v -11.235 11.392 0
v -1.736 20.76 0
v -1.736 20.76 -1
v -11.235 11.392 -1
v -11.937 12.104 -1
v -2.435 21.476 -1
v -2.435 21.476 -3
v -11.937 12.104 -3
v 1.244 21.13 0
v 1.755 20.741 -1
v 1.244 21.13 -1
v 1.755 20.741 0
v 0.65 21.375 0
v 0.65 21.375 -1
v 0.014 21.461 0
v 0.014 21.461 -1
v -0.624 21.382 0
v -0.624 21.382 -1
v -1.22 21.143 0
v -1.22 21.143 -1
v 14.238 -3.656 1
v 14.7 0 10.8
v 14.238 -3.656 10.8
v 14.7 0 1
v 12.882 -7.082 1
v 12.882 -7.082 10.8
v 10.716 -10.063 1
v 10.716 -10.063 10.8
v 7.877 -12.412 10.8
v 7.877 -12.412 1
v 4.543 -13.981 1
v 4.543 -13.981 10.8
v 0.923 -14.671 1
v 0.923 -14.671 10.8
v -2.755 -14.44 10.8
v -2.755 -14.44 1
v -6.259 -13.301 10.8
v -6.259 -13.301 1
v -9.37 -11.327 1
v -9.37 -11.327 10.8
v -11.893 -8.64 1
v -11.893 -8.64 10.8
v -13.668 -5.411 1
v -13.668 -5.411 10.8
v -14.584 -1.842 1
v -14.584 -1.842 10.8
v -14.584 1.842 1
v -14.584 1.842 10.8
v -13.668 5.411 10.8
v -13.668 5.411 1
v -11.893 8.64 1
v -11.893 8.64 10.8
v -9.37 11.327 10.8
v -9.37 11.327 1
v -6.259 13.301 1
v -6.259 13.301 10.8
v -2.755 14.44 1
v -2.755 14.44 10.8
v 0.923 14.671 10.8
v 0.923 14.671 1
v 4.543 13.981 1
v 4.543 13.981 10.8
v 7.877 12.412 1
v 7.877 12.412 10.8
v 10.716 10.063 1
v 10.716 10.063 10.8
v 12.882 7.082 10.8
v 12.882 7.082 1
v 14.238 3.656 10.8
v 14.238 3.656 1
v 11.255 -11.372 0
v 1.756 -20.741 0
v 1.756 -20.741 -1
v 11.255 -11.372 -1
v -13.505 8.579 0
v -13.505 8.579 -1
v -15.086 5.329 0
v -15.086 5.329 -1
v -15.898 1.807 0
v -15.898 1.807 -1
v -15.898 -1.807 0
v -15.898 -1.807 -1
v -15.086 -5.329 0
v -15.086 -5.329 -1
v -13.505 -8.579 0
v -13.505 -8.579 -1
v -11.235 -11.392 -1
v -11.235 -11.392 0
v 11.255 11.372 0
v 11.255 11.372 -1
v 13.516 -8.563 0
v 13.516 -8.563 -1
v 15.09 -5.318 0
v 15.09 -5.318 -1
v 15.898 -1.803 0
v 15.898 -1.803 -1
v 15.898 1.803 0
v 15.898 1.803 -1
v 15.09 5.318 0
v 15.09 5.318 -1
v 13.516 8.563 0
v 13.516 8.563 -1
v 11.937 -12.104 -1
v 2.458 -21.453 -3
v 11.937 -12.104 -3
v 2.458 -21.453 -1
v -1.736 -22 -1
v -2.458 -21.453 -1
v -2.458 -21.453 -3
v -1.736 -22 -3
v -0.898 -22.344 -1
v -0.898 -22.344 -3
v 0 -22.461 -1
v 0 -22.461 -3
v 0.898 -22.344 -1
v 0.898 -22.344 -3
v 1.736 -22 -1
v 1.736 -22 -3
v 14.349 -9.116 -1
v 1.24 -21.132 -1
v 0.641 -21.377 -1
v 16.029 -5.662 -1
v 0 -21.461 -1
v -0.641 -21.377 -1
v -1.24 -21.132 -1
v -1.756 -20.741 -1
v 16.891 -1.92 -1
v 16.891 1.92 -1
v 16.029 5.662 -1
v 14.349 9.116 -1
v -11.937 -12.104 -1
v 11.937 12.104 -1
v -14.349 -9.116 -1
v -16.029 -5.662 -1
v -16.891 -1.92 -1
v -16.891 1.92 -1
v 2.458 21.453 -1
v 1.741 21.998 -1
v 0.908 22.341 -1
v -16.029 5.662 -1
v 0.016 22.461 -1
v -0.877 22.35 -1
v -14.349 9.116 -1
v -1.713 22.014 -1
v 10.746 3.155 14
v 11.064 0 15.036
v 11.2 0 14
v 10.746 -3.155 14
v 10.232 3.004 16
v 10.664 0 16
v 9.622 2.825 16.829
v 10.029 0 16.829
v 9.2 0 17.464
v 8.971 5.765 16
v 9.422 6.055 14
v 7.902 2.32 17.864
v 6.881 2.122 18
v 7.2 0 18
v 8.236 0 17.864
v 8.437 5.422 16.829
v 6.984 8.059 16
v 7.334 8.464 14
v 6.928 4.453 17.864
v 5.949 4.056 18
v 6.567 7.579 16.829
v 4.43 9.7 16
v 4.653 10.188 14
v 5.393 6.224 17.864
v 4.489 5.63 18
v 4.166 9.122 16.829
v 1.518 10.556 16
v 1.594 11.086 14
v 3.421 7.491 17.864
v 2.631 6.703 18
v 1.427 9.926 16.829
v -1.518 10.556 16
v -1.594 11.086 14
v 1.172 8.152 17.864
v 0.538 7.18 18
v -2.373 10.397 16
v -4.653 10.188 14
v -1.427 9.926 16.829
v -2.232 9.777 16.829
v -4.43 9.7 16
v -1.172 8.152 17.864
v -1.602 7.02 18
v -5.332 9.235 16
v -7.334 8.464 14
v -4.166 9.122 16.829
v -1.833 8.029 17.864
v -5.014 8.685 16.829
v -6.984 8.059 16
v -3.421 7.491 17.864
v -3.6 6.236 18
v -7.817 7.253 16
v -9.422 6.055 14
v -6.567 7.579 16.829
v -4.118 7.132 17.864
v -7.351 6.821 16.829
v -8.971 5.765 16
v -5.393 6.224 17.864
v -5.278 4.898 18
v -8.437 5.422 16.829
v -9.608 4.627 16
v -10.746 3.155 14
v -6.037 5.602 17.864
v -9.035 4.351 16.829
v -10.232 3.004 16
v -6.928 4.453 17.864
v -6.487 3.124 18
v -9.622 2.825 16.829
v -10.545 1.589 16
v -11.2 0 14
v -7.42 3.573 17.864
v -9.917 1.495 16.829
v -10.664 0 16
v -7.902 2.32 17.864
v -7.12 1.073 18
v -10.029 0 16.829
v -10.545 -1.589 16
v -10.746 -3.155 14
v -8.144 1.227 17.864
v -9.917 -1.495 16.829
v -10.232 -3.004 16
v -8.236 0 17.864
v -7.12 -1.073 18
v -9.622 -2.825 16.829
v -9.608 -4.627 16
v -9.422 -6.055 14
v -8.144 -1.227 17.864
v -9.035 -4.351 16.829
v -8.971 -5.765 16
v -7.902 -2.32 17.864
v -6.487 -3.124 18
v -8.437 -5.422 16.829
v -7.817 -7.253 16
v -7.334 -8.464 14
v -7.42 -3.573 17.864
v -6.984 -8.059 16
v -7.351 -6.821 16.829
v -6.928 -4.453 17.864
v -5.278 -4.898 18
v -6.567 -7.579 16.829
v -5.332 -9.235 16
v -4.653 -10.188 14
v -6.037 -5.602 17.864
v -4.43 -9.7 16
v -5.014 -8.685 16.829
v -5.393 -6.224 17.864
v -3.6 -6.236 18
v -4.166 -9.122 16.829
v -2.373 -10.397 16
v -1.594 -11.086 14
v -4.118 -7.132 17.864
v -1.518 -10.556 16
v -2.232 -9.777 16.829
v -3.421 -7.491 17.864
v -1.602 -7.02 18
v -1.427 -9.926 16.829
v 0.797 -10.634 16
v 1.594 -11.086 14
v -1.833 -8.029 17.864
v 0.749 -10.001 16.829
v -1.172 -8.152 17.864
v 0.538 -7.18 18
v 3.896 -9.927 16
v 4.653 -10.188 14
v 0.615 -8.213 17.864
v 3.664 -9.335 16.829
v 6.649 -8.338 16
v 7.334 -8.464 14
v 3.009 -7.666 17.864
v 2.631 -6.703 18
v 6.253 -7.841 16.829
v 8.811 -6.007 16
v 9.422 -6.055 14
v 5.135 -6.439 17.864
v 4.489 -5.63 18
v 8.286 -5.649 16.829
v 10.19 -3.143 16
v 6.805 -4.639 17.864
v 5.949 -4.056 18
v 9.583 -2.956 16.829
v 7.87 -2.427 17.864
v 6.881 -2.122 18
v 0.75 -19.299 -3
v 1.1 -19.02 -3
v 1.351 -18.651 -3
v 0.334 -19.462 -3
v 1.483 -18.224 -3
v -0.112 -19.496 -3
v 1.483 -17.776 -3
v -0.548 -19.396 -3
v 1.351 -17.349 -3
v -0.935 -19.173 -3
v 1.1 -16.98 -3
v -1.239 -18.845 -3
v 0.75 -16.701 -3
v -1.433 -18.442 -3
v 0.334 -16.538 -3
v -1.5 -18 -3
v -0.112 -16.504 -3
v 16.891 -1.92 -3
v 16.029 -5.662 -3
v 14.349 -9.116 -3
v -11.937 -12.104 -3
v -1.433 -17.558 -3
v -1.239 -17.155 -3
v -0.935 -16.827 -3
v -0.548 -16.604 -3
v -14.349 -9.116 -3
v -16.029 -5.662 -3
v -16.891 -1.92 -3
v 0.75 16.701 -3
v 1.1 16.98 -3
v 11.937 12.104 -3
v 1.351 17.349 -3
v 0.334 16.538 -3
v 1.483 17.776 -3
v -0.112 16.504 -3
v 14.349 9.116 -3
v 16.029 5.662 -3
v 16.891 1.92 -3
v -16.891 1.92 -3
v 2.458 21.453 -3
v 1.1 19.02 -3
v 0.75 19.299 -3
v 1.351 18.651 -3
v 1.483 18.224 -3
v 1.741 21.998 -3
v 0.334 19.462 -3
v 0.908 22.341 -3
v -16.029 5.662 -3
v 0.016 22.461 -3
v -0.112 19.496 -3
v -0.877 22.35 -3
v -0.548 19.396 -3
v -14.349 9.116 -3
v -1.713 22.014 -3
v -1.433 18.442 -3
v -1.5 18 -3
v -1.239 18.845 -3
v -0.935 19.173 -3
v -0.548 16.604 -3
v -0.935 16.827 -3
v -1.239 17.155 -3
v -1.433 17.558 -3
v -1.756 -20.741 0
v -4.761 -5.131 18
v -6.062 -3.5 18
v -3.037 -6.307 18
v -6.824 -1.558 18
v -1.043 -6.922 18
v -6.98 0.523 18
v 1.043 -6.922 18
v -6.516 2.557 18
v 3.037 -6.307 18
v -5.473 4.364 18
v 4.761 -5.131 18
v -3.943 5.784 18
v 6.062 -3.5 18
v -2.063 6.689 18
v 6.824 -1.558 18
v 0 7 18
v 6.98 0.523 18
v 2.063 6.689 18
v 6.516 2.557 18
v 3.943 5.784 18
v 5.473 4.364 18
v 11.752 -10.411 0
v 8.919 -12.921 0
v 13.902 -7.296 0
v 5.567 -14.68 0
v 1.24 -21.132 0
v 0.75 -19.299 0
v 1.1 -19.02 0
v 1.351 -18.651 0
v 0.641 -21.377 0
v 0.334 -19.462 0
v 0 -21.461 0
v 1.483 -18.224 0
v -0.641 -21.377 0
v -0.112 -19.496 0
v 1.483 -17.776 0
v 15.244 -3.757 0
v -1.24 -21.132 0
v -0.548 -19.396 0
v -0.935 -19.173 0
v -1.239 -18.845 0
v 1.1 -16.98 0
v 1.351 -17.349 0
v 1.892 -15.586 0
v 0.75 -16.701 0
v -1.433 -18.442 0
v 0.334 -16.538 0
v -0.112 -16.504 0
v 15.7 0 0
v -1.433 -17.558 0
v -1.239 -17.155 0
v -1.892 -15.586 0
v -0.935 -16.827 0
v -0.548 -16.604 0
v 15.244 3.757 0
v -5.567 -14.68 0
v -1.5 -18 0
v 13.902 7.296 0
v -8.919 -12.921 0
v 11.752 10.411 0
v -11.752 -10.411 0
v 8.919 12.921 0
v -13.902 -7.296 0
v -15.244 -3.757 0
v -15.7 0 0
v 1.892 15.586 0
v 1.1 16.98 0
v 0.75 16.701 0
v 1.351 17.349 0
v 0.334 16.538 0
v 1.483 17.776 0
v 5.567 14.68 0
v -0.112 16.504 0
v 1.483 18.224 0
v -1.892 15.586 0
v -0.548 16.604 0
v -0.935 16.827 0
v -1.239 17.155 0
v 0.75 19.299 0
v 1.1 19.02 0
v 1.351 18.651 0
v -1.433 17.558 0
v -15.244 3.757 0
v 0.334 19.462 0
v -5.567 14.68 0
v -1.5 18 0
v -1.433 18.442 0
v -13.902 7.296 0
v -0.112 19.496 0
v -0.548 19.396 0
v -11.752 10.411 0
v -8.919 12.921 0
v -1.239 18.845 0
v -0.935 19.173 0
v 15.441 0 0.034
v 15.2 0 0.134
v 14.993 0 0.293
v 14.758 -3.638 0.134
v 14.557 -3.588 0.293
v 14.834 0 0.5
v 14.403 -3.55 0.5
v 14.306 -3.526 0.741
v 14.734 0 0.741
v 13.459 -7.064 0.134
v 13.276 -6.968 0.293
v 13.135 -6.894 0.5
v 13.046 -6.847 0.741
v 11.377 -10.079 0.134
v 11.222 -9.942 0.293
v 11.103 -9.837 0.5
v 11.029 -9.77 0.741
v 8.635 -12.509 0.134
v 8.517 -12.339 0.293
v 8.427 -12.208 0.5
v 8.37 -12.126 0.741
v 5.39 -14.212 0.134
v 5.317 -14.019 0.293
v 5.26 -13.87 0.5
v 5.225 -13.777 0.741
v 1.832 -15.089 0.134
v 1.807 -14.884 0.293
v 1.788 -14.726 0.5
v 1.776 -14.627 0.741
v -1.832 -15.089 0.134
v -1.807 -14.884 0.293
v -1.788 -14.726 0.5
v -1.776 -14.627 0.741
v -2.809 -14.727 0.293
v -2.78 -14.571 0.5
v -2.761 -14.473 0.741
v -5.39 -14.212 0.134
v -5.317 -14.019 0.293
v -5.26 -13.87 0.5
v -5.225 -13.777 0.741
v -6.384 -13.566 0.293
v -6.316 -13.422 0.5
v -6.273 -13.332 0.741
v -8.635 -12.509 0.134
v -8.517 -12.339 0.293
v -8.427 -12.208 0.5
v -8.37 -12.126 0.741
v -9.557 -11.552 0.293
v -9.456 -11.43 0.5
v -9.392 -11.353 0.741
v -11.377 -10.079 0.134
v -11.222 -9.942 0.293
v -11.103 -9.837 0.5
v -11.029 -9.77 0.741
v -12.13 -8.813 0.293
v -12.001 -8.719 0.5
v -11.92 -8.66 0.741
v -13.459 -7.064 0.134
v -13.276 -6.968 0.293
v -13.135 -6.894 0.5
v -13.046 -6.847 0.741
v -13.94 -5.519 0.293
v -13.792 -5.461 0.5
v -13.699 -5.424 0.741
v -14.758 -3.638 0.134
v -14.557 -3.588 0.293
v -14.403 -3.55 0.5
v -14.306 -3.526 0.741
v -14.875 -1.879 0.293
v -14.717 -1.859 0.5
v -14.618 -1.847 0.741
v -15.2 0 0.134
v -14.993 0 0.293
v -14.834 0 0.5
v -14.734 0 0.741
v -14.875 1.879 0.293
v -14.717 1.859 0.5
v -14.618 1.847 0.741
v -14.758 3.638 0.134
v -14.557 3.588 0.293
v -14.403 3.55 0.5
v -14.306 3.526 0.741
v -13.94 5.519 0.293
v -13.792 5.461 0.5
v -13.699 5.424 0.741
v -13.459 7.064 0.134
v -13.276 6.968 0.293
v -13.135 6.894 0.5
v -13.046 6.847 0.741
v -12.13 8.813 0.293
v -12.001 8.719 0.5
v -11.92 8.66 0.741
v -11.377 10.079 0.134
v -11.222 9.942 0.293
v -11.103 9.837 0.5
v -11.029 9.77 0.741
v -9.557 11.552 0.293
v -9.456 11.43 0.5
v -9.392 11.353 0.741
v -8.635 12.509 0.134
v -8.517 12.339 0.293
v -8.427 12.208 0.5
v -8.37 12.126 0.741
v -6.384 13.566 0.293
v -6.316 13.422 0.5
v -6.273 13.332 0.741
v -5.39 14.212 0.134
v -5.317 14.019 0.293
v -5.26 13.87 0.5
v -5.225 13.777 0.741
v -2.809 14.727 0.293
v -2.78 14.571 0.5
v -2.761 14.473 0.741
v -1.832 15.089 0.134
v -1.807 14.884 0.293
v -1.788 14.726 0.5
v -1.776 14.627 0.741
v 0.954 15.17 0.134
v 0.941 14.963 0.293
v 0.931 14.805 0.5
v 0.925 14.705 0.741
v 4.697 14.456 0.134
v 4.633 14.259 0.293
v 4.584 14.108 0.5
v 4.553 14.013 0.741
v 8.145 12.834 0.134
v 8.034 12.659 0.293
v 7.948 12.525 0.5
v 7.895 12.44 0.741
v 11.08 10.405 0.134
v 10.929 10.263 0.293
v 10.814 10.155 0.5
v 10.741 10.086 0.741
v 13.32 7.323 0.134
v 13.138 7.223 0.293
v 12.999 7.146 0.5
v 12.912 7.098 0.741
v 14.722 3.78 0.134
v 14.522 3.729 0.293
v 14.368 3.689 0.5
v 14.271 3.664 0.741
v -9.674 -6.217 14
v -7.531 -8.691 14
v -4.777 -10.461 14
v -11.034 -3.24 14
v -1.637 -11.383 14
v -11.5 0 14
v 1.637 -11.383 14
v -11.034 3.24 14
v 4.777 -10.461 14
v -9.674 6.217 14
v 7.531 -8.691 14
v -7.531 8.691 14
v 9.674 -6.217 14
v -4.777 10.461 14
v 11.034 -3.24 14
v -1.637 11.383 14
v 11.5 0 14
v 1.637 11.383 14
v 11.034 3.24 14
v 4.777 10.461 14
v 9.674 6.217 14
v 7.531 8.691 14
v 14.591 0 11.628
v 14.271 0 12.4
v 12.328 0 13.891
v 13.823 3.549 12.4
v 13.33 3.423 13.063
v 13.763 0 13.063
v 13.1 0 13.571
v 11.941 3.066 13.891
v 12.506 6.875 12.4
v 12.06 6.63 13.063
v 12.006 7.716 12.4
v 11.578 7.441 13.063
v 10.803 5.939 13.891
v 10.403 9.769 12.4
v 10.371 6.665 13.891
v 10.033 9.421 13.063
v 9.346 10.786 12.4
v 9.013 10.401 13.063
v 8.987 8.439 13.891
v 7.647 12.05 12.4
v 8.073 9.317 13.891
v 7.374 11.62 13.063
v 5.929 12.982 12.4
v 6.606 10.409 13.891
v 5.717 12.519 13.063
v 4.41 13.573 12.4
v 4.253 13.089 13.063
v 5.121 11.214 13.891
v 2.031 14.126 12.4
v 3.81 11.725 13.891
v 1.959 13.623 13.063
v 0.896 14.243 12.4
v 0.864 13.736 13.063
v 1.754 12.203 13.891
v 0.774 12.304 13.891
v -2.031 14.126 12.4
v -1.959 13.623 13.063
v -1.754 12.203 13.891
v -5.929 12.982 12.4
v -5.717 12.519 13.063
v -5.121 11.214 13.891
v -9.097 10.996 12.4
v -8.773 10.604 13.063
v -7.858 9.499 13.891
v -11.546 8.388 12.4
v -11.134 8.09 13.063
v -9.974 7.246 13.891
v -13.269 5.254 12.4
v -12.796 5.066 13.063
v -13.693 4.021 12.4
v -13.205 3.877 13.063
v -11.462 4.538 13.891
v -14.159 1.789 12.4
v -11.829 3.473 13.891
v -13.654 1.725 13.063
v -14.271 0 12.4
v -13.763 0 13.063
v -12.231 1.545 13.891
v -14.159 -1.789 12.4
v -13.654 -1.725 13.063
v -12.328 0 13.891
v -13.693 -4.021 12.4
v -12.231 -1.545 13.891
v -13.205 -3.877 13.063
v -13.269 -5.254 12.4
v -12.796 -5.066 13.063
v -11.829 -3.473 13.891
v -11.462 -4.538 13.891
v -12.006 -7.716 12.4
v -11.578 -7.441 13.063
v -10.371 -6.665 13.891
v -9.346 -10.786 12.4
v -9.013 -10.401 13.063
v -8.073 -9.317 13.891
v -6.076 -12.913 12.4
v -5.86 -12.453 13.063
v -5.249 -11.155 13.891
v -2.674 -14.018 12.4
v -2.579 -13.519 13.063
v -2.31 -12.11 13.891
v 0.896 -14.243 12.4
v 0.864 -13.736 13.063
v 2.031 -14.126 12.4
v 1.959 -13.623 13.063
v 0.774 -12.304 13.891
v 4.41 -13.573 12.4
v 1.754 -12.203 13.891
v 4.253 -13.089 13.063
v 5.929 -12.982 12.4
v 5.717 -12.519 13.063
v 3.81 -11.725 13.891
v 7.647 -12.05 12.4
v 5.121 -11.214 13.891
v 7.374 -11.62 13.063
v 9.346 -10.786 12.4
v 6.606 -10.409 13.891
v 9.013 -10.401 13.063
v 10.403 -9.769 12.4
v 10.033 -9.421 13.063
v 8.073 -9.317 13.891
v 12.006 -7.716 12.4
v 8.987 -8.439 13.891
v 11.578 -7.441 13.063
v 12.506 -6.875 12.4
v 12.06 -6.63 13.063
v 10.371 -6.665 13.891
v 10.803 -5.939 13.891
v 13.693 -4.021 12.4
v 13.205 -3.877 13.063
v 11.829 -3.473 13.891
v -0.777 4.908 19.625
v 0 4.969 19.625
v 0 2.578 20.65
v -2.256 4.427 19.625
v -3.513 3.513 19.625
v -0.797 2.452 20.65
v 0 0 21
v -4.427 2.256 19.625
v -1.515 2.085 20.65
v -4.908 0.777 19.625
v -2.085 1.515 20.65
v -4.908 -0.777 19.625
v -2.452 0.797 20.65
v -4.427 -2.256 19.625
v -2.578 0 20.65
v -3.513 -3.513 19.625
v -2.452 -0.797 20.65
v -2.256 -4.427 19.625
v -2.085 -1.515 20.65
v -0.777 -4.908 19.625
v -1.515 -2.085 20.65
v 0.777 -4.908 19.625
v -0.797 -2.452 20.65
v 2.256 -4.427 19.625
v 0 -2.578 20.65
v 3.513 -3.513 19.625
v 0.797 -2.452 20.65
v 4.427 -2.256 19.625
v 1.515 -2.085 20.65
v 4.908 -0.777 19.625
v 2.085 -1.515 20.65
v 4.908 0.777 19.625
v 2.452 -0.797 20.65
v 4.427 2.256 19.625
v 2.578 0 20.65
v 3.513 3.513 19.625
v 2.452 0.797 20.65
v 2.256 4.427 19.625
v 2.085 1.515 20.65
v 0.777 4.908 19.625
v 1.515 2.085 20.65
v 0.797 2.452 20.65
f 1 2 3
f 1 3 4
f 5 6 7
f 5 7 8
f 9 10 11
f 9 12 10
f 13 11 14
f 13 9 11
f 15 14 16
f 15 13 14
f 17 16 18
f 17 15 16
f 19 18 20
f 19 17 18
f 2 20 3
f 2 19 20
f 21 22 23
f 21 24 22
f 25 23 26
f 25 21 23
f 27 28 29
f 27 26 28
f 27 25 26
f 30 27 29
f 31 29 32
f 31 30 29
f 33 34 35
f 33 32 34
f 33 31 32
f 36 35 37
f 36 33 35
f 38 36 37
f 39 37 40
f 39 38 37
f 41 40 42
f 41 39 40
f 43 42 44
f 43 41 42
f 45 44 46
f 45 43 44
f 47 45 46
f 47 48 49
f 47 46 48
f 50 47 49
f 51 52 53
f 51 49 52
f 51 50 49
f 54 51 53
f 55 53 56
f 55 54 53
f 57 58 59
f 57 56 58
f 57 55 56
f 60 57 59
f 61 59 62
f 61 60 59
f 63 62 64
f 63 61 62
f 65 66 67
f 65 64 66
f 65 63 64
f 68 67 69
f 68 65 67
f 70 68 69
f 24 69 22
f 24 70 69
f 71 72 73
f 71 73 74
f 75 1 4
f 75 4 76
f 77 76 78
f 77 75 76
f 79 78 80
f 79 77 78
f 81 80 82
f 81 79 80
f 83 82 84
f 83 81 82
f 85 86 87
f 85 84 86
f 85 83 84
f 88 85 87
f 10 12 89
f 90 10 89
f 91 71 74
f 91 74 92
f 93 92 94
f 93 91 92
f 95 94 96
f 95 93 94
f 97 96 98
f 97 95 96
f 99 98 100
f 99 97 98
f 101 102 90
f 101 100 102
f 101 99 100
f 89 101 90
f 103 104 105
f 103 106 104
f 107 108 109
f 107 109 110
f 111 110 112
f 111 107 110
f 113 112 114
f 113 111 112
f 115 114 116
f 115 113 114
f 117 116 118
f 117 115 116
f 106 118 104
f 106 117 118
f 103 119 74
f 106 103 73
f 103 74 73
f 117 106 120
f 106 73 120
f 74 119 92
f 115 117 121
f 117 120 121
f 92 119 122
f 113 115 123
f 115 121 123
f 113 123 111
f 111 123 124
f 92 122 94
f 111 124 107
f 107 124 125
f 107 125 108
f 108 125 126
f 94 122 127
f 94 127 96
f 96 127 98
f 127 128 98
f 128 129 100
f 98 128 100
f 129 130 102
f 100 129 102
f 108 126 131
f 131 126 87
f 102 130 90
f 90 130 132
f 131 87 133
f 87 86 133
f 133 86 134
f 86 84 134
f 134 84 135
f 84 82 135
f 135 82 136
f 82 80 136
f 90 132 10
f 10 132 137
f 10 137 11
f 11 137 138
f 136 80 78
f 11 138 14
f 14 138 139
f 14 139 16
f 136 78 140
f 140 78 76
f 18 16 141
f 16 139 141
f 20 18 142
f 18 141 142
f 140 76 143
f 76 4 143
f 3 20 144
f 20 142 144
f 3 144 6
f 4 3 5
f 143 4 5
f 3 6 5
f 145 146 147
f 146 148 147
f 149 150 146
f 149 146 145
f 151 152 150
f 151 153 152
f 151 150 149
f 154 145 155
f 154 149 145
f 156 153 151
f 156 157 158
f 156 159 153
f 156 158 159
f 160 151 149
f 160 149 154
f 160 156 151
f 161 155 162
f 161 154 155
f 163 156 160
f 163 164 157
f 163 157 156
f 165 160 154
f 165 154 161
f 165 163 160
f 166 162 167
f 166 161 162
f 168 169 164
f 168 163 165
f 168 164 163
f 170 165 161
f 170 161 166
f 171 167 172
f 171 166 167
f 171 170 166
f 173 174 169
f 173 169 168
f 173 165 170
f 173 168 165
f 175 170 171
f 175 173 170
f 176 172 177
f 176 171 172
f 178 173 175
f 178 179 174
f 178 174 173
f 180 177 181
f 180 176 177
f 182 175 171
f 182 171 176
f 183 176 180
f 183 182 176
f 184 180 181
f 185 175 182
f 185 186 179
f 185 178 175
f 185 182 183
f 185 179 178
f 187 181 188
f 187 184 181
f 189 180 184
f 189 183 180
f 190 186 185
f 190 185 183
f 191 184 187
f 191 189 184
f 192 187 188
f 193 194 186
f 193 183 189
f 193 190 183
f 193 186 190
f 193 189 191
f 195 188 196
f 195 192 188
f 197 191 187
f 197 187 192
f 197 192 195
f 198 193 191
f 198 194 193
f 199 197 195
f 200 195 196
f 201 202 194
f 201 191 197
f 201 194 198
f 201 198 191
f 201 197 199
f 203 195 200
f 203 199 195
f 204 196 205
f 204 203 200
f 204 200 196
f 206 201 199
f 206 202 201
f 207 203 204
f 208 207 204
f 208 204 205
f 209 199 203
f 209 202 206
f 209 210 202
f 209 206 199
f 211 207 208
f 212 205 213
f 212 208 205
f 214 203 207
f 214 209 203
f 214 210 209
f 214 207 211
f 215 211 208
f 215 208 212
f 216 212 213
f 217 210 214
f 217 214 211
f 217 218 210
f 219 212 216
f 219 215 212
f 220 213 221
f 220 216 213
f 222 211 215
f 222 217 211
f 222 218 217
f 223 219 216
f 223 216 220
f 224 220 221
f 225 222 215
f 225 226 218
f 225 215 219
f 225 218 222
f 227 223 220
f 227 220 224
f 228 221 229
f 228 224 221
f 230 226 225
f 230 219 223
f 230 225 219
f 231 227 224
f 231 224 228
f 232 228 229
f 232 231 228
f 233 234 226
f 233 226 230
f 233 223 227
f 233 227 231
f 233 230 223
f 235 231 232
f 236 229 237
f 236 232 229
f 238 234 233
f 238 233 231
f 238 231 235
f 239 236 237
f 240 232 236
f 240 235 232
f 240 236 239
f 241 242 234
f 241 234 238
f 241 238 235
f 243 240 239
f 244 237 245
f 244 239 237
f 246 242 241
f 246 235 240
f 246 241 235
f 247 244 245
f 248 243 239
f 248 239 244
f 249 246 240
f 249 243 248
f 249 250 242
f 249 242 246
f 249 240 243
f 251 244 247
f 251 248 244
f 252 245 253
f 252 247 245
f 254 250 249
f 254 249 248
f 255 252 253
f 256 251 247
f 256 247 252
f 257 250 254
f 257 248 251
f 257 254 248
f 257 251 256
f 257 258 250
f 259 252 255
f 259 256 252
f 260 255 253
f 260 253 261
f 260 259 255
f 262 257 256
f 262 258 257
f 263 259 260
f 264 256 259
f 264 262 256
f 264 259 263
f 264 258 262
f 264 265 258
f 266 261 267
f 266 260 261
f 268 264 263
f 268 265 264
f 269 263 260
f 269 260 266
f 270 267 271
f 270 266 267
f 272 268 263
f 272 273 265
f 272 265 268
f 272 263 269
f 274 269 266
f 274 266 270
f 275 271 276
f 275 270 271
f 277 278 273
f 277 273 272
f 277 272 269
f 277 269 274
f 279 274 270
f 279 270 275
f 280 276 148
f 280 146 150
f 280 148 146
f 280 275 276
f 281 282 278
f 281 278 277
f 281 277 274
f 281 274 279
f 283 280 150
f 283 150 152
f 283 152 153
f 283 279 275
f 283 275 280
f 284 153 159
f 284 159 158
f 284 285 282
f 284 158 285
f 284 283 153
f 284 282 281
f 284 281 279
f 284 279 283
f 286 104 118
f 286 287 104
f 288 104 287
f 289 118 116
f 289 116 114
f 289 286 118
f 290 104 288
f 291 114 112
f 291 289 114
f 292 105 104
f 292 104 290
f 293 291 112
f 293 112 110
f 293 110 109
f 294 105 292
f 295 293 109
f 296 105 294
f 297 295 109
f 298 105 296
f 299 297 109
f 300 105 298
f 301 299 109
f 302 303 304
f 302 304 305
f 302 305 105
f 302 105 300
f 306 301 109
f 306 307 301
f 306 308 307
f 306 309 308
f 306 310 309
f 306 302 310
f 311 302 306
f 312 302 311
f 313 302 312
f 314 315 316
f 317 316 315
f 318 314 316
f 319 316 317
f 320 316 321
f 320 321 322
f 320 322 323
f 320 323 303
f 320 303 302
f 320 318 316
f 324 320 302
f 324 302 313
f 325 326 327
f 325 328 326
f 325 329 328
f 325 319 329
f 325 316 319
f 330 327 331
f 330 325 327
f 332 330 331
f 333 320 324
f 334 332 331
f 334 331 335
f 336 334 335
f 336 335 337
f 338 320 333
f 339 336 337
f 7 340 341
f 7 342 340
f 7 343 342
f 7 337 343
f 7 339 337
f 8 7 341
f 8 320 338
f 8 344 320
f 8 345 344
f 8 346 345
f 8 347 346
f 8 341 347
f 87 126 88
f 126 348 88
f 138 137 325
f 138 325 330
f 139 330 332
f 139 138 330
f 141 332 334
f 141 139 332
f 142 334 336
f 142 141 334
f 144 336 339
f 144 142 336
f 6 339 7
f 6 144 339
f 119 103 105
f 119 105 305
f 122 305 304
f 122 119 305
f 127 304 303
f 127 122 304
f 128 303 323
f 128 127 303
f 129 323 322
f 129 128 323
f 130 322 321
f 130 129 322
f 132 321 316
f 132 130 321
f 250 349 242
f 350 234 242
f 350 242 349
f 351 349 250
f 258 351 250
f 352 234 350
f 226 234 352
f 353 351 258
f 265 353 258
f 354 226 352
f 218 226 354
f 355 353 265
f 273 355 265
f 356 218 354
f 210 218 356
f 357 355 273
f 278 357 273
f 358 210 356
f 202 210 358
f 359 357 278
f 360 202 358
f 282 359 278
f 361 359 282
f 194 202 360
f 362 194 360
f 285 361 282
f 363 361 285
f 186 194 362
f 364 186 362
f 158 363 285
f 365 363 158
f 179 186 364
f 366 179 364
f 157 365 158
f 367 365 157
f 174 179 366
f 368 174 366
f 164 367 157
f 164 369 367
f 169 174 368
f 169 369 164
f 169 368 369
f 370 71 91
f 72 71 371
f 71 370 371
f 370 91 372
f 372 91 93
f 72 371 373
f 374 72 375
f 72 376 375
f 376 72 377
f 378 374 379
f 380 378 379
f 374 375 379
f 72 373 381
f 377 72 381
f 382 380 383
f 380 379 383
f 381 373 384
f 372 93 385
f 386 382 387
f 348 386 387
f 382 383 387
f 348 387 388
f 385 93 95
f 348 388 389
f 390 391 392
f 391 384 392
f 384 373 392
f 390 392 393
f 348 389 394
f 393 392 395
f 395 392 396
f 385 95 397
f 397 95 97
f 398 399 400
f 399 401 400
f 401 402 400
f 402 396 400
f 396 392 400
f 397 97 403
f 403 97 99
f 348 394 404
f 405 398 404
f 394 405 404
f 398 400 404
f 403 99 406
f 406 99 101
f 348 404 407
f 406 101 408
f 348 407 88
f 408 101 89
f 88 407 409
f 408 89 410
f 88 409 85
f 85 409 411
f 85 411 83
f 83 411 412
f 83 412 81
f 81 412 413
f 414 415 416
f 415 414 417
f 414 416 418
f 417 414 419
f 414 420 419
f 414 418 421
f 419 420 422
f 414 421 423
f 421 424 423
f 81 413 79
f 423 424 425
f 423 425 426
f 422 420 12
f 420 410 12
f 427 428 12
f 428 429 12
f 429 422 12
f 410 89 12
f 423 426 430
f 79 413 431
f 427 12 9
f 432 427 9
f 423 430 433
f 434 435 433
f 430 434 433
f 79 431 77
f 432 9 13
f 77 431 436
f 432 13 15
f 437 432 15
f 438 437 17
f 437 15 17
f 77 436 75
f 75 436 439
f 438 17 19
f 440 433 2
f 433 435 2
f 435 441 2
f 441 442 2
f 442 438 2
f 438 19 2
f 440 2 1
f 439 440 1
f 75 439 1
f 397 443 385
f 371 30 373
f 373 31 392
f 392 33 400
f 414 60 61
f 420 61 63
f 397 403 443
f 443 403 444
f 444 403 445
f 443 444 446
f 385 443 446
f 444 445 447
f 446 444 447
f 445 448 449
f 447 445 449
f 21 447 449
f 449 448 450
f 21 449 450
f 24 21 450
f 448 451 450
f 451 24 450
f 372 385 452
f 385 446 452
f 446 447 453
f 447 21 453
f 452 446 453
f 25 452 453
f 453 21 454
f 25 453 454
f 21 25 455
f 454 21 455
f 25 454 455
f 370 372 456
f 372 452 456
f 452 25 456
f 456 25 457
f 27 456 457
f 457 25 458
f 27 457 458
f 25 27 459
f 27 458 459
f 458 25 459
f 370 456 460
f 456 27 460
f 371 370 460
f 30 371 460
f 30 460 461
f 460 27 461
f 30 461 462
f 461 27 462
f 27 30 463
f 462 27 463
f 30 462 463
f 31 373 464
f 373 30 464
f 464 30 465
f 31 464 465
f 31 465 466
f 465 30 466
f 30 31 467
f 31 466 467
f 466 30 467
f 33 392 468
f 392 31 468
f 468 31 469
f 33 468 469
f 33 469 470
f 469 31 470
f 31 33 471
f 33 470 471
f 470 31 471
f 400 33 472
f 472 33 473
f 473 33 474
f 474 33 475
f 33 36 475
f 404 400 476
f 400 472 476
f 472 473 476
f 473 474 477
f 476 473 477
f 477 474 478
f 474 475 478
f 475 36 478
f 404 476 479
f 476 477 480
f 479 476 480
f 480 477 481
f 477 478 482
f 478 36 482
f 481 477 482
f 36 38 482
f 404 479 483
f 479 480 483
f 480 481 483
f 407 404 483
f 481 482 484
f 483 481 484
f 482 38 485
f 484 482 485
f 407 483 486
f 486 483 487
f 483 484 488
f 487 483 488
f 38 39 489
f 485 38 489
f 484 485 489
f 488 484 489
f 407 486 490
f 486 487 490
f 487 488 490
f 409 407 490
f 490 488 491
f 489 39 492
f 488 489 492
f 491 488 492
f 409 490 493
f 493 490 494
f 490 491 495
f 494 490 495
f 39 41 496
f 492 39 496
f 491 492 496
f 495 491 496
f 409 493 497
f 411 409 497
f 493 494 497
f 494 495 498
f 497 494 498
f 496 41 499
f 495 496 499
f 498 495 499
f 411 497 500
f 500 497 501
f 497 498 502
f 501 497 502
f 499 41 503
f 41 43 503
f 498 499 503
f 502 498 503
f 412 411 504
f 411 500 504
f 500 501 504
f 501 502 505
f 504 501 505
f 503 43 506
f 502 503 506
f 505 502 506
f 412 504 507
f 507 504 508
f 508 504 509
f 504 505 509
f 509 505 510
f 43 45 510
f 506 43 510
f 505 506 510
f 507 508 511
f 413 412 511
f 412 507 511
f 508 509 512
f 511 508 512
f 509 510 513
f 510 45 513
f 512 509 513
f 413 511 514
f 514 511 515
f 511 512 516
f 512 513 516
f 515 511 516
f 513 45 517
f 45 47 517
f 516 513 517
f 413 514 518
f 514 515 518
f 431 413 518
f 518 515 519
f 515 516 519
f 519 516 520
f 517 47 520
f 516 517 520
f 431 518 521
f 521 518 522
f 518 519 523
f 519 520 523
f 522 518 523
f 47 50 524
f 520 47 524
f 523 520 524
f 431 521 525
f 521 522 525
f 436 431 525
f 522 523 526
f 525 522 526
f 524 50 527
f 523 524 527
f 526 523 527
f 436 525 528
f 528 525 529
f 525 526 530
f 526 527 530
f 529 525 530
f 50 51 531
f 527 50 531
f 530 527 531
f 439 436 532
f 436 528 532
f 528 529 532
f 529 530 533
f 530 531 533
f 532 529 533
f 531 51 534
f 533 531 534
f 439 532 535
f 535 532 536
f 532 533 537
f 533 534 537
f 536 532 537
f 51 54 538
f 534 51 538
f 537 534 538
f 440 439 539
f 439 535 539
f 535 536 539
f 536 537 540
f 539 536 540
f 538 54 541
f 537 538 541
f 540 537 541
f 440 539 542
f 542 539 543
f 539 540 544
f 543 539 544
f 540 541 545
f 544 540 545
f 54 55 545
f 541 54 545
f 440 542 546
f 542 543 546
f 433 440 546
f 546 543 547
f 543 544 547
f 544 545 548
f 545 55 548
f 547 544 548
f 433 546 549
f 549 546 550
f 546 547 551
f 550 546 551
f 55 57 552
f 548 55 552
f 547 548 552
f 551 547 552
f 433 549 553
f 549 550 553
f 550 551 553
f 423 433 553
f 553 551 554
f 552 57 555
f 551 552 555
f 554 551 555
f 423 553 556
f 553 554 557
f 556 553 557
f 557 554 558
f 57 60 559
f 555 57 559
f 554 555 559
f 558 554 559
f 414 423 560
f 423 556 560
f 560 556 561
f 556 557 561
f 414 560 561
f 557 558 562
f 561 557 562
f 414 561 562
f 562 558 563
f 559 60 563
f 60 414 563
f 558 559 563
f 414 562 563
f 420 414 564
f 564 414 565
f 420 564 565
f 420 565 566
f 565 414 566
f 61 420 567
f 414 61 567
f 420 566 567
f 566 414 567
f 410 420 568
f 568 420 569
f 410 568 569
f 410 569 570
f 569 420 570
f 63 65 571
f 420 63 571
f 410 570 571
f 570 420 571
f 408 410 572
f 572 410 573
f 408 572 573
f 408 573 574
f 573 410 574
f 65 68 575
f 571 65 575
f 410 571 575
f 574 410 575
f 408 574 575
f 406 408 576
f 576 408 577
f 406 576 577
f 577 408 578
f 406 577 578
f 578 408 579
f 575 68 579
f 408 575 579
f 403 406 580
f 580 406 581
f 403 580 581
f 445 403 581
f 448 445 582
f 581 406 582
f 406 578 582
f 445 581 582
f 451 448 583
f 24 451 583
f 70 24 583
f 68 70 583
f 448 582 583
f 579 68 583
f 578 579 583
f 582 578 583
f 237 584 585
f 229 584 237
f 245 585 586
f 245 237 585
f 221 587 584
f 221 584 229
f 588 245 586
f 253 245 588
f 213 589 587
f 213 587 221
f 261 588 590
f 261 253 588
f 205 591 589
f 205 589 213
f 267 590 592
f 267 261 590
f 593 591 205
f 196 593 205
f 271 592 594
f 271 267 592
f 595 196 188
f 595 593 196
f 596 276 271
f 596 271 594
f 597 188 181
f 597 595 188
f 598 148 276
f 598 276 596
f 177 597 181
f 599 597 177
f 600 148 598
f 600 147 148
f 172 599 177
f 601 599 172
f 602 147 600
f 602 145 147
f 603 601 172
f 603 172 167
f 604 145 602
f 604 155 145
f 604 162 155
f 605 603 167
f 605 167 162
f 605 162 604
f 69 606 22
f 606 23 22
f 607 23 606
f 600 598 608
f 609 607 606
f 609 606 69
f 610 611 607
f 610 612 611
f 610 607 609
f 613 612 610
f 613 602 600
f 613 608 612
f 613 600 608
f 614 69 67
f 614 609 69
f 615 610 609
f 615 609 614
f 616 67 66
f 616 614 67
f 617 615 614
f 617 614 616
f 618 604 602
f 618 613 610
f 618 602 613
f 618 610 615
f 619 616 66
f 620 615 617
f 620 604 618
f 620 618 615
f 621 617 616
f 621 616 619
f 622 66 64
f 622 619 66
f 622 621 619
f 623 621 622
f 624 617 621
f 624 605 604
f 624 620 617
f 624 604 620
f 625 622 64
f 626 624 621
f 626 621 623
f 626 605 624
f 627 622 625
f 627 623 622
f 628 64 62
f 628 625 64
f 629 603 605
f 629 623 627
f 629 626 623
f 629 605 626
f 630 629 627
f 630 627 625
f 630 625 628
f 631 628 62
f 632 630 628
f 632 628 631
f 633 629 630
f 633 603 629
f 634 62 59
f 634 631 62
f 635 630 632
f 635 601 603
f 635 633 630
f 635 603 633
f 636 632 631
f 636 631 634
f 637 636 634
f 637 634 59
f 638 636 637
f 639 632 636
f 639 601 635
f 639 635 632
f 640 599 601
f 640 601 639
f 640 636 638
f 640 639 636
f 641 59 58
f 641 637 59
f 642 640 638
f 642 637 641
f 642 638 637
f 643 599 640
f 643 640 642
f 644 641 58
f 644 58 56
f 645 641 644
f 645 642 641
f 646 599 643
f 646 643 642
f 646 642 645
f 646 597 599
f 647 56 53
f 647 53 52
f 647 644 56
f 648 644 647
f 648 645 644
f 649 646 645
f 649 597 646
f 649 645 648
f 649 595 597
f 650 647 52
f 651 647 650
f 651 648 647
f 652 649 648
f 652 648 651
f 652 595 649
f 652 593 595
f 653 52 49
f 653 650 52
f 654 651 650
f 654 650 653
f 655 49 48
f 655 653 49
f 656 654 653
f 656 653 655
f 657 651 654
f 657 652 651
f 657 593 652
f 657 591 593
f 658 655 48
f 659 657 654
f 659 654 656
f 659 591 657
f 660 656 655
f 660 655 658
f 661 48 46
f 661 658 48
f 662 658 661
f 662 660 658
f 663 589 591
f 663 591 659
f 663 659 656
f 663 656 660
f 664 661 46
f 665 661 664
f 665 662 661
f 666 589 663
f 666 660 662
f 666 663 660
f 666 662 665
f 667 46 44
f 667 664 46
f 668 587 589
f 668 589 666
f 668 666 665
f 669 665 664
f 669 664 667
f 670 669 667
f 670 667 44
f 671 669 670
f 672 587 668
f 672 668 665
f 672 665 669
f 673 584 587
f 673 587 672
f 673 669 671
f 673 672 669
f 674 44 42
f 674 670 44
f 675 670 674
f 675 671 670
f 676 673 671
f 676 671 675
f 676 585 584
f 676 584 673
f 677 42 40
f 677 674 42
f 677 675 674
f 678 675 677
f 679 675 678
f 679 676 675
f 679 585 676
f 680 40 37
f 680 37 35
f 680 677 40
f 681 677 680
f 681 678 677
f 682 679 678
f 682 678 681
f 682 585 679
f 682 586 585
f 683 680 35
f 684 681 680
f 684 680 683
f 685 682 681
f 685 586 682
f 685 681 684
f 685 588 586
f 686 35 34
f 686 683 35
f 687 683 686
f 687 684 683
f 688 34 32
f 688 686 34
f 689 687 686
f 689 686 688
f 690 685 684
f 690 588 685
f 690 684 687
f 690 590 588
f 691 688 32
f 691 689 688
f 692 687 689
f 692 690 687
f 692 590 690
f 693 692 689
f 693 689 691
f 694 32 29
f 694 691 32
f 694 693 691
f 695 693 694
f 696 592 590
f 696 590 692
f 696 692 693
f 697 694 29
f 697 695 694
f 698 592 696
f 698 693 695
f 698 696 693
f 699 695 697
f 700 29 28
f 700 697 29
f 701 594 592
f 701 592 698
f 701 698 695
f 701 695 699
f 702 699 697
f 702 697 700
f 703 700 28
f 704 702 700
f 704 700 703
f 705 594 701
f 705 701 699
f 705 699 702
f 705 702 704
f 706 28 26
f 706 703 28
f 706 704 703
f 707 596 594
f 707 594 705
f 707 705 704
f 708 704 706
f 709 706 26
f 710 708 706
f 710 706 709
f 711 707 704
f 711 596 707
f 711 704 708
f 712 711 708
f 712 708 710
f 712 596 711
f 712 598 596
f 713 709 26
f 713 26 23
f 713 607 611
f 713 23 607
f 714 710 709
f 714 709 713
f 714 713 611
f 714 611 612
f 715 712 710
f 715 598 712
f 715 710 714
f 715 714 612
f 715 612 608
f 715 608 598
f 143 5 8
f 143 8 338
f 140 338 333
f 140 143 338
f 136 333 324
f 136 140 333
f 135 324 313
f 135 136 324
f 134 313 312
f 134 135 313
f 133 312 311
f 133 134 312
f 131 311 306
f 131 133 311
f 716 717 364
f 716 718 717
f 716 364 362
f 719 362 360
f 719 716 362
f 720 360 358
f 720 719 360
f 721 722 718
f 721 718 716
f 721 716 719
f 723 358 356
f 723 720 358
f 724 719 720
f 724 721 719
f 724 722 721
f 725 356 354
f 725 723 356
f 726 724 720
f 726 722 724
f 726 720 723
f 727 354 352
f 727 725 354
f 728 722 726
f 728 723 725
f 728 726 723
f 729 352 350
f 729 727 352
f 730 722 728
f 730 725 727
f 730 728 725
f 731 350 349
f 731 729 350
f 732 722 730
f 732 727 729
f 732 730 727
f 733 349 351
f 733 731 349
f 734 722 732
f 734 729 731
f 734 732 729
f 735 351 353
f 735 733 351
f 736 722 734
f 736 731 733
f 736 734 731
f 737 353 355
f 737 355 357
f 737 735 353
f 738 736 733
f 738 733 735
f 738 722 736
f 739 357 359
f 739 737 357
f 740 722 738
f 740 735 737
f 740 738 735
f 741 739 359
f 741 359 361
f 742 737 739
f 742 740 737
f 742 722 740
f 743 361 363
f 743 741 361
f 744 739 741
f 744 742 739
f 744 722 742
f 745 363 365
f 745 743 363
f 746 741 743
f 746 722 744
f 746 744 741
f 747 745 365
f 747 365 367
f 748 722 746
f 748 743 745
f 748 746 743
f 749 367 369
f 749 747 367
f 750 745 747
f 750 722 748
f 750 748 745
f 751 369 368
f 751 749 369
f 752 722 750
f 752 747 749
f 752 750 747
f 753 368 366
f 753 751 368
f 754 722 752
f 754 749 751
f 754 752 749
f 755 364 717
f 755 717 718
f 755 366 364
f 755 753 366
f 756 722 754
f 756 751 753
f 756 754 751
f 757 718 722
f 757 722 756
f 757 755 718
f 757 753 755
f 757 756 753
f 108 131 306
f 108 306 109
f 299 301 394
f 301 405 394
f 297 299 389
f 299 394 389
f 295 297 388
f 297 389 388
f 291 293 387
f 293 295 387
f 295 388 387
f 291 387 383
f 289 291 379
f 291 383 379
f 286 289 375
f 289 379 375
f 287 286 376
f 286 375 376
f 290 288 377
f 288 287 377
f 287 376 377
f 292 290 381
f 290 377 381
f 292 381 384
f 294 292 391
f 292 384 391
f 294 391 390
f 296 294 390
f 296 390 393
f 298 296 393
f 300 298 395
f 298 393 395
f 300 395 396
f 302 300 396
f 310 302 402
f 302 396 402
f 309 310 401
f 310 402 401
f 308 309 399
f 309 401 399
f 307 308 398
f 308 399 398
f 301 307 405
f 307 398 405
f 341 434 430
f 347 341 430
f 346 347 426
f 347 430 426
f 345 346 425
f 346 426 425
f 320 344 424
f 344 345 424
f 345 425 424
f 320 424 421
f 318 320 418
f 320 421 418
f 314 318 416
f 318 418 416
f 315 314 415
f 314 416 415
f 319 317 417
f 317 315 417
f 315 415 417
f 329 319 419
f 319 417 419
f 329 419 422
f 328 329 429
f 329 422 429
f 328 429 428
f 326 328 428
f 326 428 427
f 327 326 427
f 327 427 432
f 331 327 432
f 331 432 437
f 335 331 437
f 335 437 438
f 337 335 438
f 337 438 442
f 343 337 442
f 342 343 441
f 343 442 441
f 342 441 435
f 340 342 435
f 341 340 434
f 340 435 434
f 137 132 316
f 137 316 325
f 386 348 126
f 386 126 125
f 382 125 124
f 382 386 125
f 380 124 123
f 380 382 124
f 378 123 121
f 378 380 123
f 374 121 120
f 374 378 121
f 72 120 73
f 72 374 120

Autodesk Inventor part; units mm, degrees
ref_plane "YZ Plane" through (0, 0, 0) normal (1, 0, 0) x (0, 1, 0)
ref_plane "XZ Plane" through (0, 0, 0) normal (0, 1, 0) x (-1, 0, 0)
ref_plane "XY Plane" through (0, 0, 0) normal (0, 0, 1) x (1, 0, 0)
sketch "Sketch1" plane through (0, 0, 0) normal (0, 0, 1) x (1, 0, 0)
  circle A0 centre (0, 0) radius 14.7
  dimension "d0" = 29.4
extrude "Extrusion1" add sketch "Sketch1" along normal blind 14
sketch "Sketch2" plane through (0, 0, 14) normal (0, 0, 1) x (1, 0, 0)
  circle A0 centre (0, 0) radius 11.2
  dimension "d3" = 22.4
extrude "Extrusion2" add sketch "Sketch2" along normal blind 4
fillet "Fillet1" radius 3.2 1 edges at (-14.7, 0, 14)
fillet "Fillet2" radius 4 1 edges at (-11.2, 0, 18)
sketch "Sketch3" plane through (0, 0, 0) normal (1, 0, 0) x (0, 1, 0)
  line L0 (-7.2, 18) -> (7.2, 18) projected
  line L1 (7.2, 18) -> (-7.2, 18)
  arc A0 (7, 18) -> (-7, 18) centre (0, 11.3333) ccw
  line L2 (0, 18) -> (0, 21)
  point P0 (0, 0)
  dimension "d9" = 14
revolve "Revolution1" add sketch "Sketch3" angle 360 about axis through (0, 0, 18) along (0, 0, 1) picked at (4.1722, 18.4238) contours L2 A0 L0
sketch "Sketch4" plane through (0, 0, 0) normal (0, 0, -1) x (-1, 0, 0)
  arc A0 (-1.7555, -20.7411) -> (1.7555, -20.7411) centre (0, -18.9612) ccw
  line L0 (1.7555, -20.7411) -> (11.2352, -11.3917)
  line L1 (-1.7555, -20.7411) -> (-11.2549, -11.3723)
  arc A1 (1.7361, 20.7603) -> (-1.7554, 20.7412) centre (0.0001, 18.9613) ccw
  line L2 (1.7361, 20.7603) -> (11.2352, 11.3917)
  line L3 (-1.7554, 20.7412) -> (-11.2549, 11.3723)
  arc A2 (-11.2352, 11.3917) -> (-11.2352, -11.3917) centre (0, 0) ccw
  arc A3 (11.2352, -11.3917) -> (11.2352, 11.3917) centre (0, 0) ccw
  circle A4 centre (0, 18) radius 1.5
  circle A5 centre (0, -18) radius 1.5
  dimension "d13" = 5
  dimension "d19" = 32
  dimension "d22" = 3
  dimension "d23" = 3
sketch "Sketch5" plane through (0, 0, 0) normal (0, 1, 0) x (-1, 0, 0)
  point P0 (0, 0)
extrude "Extrusion4" add sketch "Sketch4" along normal blind 1
fillet "Fillet5" radius 1 1 edges at (-14.7, 0, 0)
sketch "Sketch7" plane through (0, 0, -1) normal (0, 0, -1) x (-1, 0, 0)
  line L0 (-11.2352, -11.3917) -> (-1.7555, -20.7411) projected
  line L1 (1.7555, -20.7411) -> (11.2352, -11.3917) projected
  arc A0 (-1.7555, -20.7411) -> (1.7555, -20.7411) centre (0, -18.9612) ccw projected
  arc A1 (-11.2352, 11.3917) -> (-11.2352, -11.3917) centre (0, 0) ccw projected
  line L2 (-1.7554, 20.7412) -> (-11.2352, 11.3917) projected
  line L3 (11.2352, 11.3917) -> (1.7361, 20.7603) projected
  circle A2 centre (0, -18) radius 1.5 projected
  circle A3 centre (0, 18) radius 1.5 projected
  arc A4 (-1.7555, -20.7411) -> (1.7555, -20.7411) centre (0, -18.9612) ccw projected
  line L4 (1.7555, -20.7411) -> (11.2352, -11.3917) projected
  arc A5 (11.2352, -11.3917) -> (11.2352, 11.3917) centre (0, 0) ccw projected
  line L5 (11.2352, 11.3917) -> (1.7361, 20.7603) projected
  arc A6 (1.7361, 20.7603) -> (-1.7554, 20.7412) centre (0.0001, 18.9613) ccw projected
  line L6 (-1.7554, 20.7412) -> (-11.2352, 11.3917) projected
  arc A7 (-11.2352, 11.3917) -> (-11.2352, -11.3917) centre (0, 0) ccw projected
  line L7 (-11.2352, -11.3917) -> (-1.7555, -20.7411) projected
  arc A8 (1.7361, 20.7603) -> (-1.7554, 20.7412) centre (0.0001, 18.9613) ccw projected
  arc A9 (11.9374, -12.1037) -> (11.9374, 12.1037) centre (0, 0) ccw
  line L8 (11.9374, -12.1037) -> (2.4577, -21.4531)
  arc A10 (-2.4577, -21.4531) -> (2.4577, -21.4531) centre (0, -18.9612) ccw
  line L9 (-2.4577, -21.4531) -> (-11.9374, -12.1037)
  arc A11 (-11.9374, 12.1037) -> (-11.9374, -12.1037) centre (0, 0) ccw
  line L10 (-11.9374, 12.1037) -> (-2.4576, 21.4532)
  arc A12 (2.4347, 21.4758) -> (-2.4576, 21.4532) centre (0.0001, 18.9613) ccw
  line L11 (2.4347, 21.4758) -> (11.9374, 12.1037)
  dimension "d27" = 1
extrude "Extrusion5" add sketch "Sketch7" along normal blind 2 contours A1 L2 A6 L3 A5 L1 A0 L0 | L8 A10 L9 A11 L10 A12 L11 A9
properties part number "wheel2"
